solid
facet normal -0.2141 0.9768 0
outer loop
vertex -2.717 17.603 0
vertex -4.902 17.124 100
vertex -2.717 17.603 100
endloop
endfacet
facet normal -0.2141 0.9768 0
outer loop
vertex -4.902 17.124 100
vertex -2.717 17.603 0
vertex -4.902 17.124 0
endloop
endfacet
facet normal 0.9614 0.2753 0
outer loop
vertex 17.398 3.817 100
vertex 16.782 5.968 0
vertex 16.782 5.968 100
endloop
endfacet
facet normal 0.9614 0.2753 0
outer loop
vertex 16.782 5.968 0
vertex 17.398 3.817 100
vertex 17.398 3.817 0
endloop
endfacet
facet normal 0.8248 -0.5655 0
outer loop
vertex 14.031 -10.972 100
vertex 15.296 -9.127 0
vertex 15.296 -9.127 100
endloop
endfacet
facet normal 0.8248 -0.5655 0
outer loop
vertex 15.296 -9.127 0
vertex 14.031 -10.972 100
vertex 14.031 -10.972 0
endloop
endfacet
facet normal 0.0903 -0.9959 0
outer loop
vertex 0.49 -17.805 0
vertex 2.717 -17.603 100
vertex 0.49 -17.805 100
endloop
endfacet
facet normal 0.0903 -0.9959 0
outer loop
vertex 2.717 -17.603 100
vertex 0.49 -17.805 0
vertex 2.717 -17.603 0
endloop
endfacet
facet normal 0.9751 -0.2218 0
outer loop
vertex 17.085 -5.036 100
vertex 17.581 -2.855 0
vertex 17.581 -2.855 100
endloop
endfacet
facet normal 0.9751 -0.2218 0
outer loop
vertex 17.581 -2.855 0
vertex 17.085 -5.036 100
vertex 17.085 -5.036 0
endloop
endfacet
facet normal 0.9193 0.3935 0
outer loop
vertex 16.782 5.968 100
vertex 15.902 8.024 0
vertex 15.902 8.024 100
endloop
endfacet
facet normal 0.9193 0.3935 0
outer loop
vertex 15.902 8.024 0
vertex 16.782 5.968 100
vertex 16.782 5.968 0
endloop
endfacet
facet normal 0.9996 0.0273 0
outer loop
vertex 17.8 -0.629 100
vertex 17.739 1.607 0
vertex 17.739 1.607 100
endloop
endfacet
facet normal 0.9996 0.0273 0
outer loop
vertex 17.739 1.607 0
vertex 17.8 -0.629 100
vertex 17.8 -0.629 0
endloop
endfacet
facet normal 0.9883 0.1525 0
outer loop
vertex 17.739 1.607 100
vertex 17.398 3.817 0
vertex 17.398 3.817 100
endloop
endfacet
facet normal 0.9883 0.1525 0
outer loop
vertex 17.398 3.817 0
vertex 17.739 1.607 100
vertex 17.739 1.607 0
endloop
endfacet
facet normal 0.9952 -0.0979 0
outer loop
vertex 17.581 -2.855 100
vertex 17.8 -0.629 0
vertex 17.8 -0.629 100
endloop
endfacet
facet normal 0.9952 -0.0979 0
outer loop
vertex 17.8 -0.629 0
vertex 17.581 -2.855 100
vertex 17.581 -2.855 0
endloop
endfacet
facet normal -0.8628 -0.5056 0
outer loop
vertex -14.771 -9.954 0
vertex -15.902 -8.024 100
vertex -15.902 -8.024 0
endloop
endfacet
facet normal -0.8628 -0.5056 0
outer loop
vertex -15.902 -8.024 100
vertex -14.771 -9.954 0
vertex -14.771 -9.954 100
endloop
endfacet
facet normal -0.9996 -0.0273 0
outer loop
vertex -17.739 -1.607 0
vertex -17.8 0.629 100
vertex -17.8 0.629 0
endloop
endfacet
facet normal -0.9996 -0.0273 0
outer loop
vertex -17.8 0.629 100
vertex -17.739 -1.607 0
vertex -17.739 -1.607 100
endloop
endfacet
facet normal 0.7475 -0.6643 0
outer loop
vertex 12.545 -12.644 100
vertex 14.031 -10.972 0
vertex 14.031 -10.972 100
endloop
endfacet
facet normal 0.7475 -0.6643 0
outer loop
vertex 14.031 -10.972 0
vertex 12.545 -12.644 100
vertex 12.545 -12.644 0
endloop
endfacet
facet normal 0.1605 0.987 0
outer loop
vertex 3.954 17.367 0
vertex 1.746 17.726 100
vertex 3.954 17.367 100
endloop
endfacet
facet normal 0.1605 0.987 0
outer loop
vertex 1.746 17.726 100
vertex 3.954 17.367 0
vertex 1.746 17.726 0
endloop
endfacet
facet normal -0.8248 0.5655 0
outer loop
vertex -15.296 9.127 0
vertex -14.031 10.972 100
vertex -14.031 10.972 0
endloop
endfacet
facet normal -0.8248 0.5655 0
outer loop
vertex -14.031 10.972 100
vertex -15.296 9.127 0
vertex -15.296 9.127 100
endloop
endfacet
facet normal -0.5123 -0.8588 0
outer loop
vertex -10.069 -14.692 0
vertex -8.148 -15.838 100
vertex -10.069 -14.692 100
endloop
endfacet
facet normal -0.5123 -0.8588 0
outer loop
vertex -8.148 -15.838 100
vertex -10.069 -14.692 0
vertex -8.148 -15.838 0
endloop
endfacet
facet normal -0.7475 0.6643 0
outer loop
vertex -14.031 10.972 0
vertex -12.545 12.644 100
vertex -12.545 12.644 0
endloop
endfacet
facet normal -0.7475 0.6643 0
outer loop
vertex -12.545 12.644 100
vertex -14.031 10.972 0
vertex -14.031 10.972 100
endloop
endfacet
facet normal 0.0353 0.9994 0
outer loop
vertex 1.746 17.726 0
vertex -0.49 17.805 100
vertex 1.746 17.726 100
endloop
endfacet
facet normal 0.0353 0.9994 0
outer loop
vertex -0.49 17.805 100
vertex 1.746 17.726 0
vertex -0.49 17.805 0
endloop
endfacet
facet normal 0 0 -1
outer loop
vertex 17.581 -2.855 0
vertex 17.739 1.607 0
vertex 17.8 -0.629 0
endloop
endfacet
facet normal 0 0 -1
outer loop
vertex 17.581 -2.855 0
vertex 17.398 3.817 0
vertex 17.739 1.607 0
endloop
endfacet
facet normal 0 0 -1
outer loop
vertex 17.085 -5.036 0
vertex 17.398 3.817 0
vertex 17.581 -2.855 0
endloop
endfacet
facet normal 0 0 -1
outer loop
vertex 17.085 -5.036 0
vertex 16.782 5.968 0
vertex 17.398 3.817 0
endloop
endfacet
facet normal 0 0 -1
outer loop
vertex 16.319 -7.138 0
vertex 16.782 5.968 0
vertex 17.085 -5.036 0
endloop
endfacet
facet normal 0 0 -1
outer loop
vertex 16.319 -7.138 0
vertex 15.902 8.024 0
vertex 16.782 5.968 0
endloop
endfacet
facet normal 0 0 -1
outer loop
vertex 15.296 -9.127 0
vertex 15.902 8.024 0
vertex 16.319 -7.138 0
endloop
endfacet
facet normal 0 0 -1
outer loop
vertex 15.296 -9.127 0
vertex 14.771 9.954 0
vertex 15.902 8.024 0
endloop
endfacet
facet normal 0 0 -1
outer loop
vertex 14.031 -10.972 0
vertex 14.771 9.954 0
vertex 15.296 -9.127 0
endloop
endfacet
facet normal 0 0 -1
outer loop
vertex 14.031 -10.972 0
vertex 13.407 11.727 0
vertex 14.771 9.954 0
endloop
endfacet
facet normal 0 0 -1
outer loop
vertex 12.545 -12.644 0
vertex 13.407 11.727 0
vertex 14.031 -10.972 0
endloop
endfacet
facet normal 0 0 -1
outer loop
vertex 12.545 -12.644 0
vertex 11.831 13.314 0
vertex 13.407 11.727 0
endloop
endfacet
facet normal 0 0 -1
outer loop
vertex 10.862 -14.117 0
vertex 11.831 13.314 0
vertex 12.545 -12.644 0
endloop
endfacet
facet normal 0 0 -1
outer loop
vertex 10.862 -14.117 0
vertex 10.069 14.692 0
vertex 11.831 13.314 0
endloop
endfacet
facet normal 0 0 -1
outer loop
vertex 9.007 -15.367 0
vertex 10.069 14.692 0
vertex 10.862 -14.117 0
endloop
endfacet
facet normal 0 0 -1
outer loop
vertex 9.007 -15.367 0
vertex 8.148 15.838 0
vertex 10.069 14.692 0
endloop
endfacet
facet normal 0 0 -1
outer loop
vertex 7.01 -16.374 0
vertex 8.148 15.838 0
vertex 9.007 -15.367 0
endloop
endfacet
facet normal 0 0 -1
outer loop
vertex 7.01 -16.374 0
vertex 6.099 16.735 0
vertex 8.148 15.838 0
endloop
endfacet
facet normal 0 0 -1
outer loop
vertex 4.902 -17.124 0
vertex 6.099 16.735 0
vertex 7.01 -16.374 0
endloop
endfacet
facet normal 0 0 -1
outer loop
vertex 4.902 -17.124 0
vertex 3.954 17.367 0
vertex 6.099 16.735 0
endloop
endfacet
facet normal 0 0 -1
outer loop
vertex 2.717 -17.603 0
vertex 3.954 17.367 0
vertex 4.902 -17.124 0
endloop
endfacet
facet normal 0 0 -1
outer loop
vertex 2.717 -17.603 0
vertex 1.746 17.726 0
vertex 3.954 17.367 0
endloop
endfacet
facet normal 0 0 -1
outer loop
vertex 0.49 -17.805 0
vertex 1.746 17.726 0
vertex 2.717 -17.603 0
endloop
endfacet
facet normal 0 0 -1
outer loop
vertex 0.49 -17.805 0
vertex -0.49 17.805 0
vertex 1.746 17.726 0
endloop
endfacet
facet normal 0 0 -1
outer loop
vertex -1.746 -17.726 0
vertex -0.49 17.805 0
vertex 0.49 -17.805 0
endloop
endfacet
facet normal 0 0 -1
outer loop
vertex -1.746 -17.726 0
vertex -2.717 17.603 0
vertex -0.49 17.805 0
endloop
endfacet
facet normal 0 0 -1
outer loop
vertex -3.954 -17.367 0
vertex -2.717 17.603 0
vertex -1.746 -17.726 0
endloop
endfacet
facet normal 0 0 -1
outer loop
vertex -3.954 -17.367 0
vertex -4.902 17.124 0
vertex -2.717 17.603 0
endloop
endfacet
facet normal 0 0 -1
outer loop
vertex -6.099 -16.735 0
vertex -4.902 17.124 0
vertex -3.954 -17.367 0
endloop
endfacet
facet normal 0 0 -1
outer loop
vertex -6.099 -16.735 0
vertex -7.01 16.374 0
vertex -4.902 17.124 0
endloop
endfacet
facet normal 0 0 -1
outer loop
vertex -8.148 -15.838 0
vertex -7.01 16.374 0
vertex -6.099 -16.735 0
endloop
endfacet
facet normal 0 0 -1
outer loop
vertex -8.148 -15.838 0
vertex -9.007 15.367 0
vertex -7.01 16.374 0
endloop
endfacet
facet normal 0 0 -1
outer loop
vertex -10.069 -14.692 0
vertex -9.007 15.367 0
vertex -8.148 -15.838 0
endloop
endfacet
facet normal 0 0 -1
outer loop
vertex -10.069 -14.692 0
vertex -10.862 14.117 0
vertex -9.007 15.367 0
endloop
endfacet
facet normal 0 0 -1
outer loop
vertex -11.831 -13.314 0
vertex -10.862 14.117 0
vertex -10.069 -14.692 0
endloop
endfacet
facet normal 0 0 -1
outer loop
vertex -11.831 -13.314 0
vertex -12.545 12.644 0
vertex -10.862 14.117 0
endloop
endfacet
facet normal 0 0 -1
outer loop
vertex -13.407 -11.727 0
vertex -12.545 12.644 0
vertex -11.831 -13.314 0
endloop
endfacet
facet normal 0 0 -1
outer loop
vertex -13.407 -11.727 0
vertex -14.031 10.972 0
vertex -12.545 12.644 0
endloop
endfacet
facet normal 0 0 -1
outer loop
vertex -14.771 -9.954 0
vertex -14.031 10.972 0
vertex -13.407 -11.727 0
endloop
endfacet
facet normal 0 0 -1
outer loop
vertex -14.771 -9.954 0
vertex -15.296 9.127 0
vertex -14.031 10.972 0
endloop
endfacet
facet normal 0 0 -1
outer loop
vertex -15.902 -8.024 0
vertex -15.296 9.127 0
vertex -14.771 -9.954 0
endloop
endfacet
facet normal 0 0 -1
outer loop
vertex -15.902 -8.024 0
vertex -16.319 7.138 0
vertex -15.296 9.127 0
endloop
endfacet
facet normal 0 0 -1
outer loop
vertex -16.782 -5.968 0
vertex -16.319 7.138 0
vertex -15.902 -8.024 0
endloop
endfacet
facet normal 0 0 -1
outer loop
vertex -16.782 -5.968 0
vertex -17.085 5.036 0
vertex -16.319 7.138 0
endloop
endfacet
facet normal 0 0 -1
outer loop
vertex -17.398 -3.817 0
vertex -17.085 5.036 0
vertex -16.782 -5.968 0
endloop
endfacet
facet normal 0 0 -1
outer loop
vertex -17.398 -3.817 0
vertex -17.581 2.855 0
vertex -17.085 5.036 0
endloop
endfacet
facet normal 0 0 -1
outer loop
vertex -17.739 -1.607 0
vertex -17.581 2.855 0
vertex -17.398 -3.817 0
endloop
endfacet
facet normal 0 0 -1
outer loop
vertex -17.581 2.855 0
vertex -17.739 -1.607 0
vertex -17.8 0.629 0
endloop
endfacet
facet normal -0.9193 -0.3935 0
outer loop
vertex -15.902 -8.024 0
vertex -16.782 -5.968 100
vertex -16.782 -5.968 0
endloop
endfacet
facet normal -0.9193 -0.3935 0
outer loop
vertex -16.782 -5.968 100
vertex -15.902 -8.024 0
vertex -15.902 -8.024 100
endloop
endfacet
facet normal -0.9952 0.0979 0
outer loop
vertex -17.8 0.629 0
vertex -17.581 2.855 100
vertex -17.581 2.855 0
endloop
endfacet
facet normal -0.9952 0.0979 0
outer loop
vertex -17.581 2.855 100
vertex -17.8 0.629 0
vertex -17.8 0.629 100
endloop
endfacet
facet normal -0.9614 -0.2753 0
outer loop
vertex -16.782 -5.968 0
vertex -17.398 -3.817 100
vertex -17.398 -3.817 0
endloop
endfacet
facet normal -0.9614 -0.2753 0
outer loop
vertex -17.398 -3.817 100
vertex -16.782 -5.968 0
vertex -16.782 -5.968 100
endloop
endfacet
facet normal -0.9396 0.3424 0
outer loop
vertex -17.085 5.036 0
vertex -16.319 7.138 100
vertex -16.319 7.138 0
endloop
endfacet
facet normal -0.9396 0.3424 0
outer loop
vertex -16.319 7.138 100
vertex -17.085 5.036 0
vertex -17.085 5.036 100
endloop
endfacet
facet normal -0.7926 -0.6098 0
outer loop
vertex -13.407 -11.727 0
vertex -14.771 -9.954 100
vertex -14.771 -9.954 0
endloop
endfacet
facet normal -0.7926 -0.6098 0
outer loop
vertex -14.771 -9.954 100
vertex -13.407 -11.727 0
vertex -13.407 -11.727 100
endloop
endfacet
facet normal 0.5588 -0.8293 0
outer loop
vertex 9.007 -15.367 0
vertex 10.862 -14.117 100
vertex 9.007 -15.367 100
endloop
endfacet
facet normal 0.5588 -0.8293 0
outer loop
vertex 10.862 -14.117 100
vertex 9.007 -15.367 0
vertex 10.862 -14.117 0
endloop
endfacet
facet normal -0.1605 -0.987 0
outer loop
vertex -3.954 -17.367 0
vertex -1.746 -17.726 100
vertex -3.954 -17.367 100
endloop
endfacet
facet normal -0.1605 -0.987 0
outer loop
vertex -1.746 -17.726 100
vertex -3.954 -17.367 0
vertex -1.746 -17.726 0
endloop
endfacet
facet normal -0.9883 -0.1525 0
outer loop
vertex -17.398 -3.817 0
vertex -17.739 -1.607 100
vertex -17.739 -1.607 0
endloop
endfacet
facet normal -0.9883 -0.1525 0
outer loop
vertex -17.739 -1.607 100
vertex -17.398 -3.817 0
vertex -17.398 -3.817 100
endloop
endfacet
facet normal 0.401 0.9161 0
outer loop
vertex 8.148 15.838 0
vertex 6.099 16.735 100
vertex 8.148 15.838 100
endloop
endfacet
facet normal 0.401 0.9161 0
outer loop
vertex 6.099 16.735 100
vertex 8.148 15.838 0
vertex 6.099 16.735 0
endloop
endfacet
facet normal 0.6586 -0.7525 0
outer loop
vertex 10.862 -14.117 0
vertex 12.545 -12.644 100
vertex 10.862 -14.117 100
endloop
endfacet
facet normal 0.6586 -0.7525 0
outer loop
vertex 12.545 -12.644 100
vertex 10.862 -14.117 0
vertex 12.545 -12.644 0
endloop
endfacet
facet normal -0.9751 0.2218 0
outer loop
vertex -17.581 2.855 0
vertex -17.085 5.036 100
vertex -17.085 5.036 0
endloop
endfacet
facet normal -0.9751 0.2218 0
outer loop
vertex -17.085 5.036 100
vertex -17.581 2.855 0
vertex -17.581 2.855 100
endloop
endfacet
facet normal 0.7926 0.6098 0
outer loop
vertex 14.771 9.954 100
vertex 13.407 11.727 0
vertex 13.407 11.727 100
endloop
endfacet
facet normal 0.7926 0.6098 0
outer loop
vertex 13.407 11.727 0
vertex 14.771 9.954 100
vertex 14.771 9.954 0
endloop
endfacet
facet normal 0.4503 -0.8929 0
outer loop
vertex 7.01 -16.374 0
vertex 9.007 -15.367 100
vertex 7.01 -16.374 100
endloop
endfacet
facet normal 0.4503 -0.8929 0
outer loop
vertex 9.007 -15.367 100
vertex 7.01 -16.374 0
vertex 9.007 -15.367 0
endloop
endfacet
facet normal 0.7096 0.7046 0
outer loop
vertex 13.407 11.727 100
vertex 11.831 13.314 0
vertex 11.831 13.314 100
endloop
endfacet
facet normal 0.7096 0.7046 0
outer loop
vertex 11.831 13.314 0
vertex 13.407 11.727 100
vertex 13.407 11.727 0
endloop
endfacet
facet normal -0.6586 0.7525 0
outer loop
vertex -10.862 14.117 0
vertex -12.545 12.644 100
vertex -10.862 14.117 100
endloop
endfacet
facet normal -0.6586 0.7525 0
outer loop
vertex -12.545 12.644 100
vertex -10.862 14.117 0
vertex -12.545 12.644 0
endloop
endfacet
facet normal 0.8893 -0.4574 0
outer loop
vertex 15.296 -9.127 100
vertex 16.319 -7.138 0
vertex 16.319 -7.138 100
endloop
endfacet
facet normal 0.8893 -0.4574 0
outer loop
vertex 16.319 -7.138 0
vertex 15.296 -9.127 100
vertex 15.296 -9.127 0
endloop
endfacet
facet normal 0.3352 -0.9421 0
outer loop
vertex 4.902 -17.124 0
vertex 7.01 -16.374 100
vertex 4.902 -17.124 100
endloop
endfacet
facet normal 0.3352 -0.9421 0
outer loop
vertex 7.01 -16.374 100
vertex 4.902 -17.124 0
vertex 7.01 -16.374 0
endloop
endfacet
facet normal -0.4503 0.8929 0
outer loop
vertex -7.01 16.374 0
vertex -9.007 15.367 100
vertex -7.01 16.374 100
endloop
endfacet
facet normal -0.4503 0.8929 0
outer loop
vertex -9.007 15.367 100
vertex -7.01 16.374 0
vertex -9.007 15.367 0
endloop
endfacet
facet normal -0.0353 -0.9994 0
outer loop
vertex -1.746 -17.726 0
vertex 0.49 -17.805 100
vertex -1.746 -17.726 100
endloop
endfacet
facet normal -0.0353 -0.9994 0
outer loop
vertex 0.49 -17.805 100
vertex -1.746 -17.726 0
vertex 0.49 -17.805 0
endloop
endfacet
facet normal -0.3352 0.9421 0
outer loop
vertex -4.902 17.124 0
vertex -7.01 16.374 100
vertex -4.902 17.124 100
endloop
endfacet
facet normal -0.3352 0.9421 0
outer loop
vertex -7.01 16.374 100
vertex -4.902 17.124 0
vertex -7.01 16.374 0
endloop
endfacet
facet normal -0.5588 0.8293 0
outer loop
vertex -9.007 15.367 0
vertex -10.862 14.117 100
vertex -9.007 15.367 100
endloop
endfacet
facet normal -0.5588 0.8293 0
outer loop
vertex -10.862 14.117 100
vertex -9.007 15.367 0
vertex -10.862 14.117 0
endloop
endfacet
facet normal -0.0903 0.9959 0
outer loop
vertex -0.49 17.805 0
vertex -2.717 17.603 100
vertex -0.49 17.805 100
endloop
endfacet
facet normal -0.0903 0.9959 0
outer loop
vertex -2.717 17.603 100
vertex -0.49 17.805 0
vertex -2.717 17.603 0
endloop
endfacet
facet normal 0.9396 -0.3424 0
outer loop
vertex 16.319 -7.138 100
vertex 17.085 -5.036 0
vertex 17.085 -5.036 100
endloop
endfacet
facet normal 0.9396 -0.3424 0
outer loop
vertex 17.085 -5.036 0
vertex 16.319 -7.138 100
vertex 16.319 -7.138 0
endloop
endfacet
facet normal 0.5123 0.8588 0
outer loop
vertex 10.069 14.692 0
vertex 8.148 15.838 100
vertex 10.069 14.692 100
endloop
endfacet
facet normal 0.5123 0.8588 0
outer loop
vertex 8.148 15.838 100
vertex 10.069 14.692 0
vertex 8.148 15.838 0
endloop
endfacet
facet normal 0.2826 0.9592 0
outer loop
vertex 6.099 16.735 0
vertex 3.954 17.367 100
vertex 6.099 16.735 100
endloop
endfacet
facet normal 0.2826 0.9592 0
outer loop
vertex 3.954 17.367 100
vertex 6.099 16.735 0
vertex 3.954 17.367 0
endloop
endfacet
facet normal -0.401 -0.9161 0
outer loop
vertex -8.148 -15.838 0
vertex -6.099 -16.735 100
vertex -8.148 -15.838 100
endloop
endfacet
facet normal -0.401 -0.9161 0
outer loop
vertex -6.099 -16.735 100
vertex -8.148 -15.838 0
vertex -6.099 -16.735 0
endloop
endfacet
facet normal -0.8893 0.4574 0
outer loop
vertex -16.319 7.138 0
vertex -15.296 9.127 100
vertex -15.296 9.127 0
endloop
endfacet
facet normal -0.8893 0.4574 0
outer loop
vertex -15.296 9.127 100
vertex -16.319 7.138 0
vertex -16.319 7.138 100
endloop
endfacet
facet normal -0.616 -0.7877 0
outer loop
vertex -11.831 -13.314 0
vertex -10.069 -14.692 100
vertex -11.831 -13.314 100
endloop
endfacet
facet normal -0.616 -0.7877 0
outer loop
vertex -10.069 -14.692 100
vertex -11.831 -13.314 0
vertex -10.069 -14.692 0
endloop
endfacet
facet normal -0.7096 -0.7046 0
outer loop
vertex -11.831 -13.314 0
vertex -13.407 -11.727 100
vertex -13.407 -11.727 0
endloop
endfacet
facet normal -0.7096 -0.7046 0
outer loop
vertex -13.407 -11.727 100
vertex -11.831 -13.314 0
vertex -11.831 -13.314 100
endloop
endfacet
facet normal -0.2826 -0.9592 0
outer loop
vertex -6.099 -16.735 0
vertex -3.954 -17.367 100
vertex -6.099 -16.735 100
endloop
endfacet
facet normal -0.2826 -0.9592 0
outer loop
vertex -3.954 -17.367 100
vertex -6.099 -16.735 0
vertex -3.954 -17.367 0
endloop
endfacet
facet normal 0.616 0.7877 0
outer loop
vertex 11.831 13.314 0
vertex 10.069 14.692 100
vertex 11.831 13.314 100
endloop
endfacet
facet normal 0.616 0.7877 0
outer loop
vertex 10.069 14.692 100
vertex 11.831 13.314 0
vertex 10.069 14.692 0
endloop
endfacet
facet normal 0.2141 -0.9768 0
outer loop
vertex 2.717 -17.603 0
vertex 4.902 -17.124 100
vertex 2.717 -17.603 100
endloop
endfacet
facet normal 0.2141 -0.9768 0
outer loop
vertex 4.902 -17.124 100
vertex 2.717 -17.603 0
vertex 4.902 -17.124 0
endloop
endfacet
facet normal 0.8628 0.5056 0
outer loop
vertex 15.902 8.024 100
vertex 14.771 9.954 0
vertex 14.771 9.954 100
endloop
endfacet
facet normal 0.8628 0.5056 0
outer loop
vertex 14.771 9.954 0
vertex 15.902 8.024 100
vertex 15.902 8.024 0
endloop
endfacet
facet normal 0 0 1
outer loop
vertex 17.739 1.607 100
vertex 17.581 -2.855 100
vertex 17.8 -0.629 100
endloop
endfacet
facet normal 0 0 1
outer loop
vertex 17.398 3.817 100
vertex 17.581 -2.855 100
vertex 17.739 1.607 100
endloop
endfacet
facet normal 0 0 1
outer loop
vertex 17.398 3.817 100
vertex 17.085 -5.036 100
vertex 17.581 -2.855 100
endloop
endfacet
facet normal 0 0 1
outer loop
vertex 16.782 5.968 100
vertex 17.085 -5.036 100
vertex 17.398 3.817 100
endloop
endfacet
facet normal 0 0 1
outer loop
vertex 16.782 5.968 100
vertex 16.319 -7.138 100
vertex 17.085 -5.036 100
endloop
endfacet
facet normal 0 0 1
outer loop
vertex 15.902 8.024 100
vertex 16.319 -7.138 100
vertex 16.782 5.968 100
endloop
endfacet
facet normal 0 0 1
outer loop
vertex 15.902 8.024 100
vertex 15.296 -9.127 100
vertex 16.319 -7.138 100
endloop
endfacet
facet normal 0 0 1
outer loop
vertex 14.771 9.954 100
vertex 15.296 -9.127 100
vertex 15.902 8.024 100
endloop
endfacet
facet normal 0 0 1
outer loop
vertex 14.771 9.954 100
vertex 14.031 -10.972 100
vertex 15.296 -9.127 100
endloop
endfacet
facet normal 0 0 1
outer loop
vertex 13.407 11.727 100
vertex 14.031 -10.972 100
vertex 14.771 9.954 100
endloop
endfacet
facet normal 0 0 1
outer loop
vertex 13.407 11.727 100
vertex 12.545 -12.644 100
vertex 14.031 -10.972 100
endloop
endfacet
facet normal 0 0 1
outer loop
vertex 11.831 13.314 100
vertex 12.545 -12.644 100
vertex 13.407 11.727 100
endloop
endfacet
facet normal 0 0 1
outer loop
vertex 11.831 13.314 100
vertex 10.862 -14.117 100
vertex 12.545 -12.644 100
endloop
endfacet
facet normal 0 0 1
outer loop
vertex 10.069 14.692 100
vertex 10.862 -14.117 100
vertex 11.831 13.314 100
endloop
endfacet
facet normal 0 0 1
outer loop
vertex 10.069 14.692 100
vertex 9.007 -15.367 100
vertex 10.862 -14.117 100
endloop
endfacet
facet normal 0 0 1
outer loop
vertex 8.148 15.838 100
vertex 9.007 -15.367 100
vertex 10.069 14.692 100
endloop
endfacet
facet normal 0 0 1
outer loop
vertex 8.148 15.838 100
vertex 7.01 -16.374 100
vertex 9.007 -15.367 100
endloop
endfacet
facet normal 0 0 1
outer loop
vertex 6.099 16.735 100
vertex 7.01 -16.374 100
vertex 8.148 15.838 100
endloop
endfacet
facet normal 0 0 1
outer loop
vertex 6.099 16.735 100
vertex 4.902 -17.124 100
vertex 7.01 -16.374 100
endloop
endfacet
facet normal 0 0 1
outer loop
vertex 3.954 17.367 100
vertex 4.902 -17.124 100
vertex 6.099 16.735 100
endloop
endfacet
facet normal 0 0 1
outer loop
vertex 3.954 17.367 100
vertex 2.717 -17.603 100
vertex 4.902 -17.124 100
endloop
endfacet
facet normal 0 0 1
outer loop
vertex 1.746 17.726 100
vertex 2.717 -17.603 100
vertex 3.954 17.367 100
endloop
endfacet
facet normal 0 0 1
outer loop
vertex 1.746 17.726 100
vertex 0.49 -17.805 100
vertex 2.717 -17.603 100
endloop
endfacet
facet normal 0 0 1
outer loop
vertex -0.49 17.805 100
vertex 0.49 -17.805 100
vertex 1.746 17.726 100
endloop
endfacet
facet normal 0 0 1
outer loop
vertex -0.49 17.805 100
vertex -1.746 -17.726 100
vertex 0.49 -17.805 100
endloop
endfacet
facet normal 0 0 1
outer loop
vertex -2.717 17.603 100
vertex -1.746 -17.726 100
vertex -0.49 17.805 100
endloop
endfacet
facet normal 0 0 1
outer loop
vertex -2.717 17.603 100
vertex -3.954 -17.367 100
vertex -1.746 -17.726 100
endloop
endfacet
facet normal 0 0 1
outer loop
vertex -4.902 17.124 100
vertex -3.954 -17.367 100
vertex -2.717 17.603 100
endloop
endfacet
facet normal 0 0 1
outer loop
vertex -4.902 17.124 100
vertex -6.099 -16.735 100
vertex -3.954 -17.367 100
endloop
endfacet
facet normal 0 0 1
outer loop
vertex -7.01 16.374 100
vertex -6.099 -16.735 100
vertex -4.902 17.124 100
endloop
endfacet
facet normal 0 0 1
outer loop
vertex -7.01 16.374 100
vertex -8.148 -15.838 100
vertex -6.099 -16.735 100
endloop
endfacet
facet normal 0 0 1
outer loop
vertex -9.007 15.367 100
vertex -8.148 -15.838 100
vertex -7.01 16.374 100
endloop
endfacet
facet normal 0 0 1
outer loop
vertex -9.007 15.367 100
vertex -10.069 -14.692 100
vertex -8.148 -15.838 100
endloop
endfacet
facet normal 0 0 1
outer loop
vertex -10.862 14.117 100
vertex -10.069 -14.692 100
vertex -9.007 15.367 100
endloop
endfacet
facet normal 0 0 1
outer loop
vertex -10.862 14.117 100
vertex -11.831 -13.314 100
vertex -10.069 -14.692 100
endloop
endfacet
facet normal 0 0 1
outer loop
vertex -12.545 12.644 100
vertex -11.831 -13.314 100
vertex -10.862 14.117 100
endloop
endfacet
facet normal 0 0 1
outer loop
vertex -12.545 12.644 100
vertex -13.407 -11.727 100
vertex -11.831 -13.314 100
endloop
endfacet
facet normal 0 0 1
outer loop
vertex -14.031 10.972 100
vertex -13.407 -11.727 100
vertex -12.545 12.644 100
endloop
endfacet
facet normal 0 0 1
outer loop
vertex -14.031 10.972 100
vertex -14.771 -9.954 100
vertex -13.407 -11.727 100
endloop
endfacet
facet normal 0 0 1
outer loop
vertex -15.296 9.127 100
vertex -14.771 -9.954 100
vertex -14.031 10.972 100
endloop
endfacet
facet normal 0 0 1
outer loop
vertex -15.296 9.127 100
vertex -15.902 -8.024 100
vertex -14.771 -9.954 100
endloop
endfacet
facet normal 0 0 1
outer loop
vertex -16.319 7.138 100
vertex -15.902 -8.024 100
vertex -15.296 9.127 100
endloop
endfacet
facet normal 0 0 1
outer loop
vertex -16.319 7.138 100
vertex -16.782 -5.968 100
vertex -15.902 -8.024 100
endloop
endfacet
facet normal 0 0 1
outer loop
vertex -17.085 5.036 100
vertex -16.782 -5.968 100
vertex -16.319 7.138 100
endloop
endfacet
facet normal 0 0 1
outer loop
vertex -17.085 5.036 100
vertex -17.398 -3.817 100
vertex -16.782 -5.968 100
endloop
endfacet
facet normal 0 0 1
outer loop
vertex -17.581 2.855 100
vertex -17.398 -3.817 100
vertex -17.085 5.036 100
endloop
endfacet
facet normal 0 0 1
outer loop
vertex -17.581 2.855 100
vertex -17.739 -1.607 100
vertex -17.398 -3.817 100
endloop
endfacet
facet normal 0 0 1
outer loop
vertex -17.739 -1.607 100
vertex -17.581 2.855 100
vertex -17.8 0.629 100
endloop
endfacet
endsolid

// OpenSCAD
include <gears.scad>

//bevel_gear(modul=1, tooth_number=20, partial_cone_angle=20, tooth_width=2, helix_angle=20);

//

bevel_herringbone_gear(modul=2, tooth_number=20, width=20, partial_cone_angle=20, bore=0);
//bevel_gear(modul=1, tooth_number=20, partial_cone_angle=20, tooth_width=2, helix_angle=20);
//bevel_gear_pair(modul=1, gear_teeth=12, pinion_teeth=7, axis_angle=100, tooth_width=3);

//bevel_herringbone_gear_pair(modul=2, gear_teeth=40, pinion_teeth=22, tooth_width=25, axis_angle=70, helix_angle=40);

/*herringbone_ring_gear(
        modul=2,
        tooth_number=20,
        helix_angle=10,width=20,rim_width=5);
        
//herringbone_gear(modul=2, tooth_number=20, width=20, bore=0);*/

/*planetary_gear(modul=2, sun_teeth=16, planet_teeth=16, number_planets=2, width=20, rim_width=4, bore=0, helix_angle=20);*/

//herringbone_ring_gear(modul=2, tooth_number=20, width=10, rim_width=5, pressure_angle=20, helix_angle=10);
